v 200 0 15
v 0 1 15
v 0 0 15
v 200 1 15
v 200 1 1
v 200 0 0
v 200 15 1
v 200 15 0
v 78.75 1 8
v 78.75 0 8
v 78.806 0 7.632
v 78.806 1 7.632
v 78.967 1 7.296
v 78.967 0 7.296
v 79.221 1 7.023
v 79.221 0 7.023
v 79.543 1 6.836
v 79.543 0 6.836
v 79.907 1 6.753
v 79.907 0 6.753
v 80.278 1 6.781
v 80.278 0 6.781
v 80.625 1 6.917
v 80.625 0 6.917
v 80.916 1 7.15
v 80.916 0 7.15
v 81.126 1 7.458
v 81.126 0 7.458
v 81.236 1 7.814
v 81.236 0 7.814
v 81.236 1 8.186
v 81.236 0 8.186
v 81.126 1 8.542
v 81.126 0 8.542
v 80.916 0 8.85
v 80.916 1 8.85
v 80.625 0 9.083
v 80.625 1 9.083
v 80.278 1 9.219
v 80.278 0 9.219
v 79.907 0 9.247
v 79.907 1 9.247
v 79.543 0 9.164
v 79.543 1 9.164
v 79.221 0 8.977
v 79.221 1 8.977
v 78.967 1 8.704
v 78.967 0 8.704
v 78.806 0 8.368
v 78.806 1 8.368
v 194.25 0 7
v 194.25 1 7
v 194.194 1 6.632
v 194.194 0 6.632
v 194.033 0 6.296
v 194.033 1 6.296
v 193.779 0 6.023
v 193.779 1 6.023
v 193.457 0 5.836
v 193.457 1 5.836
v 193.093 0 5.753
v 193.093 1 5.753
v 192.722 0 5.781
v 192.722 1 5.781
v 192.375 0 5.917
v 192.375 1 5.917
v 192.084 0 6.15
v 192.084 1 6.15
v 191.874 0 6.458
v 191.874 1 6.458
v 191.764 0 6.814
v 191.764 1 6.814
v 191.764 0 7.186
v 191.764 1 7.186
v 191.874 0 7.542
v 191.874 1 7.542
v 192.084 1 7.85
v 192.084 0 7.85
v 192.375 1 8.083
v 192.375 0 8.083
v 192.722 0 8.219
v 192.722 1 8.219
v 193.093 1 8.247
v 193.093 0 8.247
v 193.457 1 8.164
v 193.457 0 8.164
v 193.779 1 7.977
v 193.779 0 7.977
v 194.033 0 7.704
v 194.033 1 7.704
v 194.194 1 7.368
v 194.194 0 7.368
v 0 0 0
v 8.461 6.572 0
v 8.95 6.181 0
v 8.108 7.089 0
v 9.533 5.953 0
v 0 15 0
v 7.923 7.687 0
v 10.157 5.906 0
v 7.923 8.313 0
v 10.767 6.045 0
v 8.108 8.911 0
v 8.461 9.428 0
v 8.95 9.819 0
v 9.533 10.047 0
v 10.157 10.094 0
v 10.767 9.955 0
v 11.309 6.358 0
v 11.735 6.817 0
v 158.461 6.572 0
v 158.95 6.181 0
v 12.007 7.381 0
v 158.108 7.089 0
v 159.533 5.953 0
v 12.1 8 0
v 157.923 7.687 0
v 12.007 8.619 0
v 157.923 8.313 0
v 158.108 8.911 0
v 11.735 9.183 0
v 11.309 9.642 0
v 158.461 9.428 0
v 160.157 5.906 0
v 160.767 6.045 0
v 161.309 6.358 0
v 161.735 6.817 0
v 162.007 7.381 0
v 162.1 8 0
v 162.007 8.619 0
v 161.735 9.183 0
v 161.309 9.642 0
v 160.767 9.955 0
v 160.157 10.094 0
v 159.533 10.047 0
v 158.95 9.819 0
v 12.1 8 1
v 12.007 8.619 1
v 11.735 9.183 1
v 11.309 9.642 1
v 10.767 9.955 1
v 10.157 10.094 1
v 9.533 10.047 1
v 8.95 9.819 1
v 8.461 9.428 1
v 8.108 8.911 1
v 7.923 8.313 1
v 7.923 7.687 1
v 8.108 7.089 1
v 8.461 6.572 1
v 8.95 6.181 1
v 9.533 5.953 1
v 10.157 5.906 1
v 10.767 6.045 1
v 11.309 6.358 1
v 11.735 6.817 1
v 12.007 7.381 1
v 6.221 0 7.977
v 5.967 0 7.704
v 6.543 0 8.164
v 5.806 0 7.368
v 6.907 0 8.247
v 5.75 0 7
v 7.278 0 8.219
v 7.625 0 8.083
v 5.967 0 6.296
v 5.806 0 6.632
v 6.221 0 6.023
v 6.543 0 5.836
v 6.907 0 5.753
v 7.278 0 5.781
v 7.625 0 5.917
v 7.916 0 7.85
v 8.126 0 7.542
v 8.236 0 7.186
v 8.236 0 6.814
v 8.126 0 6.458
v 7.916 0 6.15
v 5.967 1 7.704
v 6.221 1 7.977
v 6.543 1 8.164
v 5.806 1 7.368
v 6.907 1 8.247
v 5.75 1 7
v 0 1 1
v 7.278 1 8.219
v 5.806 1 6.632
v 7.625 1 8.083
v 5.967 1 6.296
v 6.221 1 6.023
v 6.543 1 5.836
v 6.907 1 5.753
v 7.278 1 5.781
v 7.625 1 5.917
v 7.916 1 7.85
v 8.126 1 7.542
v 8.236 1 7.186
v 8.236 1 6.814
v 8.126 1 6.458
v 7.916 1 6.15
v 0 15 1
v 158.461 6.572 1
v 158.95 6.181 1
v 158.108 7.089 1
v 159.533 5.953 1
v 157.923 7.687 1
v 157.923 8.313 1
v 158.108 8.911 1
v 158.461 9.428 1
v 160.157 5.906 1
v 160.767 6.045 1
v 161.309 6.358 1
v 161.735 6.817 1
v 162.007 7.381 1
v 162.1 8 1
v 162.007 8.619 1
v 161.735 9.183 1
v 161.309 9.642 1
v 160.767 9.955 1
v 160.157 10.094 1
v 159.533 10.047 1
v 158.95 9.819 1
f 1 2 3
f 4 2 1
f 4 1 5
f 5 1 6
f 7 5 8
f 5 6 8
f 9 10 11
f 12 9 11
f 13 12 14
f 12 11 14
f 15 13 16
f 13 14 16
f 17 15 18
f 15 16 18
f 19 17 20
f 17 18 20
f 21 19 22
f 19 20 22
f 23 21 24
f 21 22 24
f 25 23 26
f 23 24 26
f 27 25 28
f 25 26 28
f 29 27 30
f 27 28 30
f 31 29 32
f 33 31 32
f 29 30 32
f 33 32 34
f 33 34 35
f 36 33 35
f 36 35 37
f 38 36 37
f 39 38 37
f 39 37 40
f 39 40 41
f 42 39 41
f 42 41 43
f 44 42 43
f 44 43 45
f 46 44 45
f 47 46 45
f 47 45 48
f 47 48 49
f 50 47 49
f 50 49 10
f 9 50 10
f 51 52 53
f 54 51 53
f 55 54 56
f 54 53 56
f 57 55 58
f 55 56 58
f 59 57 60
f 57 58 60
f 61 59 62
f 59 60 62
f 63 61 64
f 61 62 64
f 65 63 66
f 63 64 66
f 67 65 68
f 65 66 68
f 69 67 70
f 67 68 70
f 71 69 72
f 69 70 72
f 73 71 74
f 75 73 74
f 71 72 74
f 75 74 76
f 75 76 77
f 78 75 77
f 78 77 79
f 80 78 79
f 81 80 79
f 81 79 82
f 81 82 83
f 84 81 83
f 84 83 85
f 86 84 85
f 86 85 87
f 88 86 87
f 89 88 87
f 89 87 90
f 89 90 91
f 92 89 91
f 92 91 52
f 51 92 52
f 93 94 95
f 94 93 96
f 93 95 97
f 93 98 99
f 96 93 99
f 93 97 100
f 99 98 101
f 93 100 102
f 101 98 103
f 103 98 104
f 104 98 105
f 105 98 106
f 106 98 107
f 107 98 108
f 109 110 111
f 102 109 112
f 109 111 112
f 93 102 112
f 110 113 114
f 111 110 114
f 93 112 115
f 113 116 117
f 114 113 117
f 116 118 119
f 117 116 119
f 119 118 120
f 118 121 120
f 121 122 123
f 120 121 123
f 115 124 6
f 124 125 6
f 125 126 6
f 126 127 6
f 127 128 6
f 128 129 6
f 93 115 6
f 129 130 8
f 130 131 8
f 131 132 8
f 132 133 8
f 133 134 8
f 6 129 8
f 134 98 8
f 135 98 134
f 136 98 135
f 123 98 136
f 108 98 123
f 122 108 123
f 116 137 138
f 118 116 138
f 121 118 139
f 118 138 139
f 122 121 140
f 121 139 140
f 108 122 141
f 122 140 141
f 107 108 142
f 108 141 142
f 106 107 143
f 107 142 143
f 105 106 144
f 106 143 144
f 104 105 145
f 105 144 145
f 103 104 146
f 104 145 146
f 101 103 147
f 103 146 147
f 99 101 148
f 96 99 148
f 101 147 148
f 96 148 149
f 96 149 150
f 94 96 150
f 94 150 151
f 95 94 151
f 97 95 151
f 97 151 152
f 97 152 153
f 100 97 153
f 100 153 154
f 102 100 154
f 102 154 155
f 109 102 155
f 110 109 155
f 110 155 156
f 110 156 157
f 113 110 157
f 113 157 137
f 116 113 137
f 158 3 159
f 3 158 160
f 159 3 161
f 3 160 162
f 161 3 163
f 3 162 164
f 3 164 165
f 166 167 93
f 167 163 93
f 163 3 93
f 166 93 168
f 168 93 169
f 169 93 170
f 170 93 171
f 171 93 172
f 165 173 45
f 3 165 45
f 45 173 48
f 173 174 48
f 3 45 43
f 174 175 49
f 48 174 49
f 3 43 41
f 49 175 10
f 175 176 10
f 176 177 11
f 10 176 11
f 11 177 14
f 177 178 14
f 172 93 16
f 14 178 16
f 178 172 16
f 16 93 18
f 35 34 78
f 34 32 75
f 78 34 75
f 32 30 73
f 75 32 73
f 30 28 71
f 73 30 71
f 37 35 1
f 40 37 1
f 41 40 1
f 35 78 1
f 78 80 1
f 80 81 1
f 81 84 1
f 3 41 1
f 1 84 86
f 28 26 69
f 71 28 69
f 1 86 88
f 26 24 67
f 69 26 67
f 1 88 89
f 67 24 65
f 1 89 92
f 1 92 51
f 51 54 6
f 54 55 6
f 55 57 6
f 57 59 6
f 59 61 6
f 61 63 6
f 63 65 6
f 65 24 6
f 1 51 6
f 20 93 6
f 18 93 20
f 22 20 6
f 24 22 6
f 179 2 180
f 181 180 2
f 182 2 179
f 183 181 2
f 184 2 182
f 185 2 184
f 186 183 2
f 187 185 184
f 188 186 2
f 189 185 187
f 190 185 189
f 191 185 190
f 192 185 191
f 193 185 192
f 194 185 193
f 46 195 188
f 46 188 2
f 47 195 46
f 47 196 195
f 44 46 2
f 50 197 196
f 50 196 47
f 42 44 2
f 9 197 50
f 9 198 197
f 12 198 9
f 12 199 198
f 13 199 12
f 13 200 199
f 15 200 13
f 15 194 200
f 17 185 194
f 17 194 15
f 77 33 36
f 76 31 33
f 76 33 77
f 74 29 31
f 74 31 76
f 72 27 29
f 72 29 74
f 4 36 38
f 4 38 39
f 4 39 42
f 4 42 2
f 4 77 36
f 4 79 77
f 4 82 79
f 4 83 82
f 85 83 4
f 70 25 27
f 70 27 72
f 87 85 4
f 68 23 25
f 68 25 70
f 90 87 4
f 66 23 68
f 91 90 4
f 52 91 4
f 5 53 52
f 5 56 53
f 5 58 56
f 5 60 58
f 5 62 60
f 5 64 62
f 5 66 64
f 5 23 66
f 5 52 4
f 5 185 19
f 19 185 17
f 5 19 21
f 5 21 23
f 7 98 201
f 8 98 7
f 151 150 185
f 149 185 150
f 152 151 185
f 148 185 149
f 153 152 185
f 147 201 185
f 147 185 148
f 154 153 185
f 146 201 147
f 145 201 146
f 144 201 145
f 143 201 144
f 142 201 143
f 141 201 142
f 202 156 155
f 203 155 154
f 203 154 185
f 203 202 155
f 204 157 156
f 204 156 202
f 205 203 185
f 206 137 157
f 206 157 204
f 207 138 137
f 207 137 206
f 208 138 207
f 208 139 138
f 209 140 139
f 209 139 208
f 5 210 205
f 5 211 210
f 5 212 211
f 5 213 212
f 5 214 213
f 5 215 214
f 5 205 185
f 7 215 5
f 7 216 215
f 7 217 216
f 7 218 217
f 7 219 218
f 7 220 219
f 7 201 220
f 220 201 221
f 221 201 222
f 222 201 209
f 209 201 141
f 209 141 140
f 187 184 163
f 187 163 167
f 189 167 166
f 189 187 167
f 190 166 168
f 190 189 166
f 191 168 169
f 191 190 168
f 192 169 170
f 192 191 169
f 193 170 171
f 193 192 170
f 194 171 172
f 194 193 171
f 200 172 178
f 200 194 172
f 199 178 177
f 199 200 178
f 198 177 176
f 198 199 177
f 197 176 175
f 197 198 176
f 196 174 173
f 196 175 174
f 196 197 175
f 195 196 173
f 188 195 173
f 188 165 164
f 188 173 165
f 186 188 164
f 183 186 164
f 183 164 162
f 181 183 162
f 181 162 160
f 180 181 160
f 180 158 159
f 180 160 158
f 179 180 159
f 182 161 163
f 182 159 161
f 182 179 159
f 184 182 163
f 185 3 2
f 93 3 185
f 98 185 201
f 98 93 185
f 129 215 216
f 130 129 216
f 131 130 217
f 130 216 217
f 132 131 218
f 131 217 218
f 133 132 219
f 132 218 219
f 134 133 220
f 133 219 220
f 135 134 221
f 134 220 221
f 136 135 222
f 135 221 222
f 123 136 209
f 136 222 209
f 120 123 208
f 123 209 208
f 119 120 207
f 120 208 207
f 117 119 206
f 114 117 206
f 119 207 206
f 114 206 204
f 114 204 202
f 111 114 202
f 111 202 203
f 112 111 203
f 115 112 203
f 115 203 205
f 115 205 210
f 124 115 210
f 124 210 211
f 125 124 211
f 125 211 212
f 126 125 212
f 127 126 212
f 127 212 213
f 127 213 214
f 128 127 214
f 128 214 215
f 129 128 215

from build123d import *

# Parameters (mm, degrees)
SKETCH_1_W      = 200
SKETCH_1_H      = 15
EXTRUDE_1_DEPTH = 1
SKETCH_2_W      = 200
SKETCH_2_H      = 1
EXTRUDE_2_DEPTH = 14
M5X0_8_1_D      = 4.2
M3X0_5_1_D      = 2.5
M3X0_5_2_D      = 2.5


with BuildPart() as part:
    # ｽｹｯﾁ1 → ﾎﾞｽ - 押し出し1 (new body)
    with BuildSketch(Plane.XY):
        with Locations((100, 7.5)):
            Rectangle(SKETCH_1_W, SKETCH_1_H)
    extrude(amount=EXTRUDE_1_DEPTH)

    # ｽｹｯﾁ2 → ﾎﾞｽ - 押し出し2 (add)
    with BuildSketch(Plane.XY.offset(1)):
        with Locations((100, 0.5)):
            Rectangle(SKETCH_2_W, SKETCH_2_H)
    extrude(amount=EXTRUDE_2_DEPTH)

    # M5x0.8 ねじ穴1 (through all)
    with Locations(Plane(origin=(0, 0, 0), x_dir=(-1, 0, 0), z_dir=(0, 0, -1))):
        with Locations((-10, 8), (-160, 8)):
            Hole(M5X0_8_1_D / 2)

    # M3x0.5 ねじ穴1 (through all)
    with Locations(Plane(origin=(0, 0, 0), x_dir=(-1, 0, 0), z_dir=(0, -1, 0))):
        with Locations((-193, -7)):
            m3x0_5_1 = Hole(M3X0_5_1_D / 2)

    # M3x0.5 ねじ穴2 (through all)
    with Locations(Plane(origin=(0, 1, 0), x_dir=(1, 0, 0), z_dir=(0, 1, 0))):
        with Locations((80, -8)):
            Hole(M3X0_5_2_D / 2)

    # ﾐﾗｰ2: M3x0.5 ねじ穴1 across plane
    add(m3x0_5_1.mirror(Plane(origin=(100, 0, 0), x_dir=(0, 0, 1), z_dir=(1, 0, 0))), mode=Mode.SUBTRACT)


solid = part.part
